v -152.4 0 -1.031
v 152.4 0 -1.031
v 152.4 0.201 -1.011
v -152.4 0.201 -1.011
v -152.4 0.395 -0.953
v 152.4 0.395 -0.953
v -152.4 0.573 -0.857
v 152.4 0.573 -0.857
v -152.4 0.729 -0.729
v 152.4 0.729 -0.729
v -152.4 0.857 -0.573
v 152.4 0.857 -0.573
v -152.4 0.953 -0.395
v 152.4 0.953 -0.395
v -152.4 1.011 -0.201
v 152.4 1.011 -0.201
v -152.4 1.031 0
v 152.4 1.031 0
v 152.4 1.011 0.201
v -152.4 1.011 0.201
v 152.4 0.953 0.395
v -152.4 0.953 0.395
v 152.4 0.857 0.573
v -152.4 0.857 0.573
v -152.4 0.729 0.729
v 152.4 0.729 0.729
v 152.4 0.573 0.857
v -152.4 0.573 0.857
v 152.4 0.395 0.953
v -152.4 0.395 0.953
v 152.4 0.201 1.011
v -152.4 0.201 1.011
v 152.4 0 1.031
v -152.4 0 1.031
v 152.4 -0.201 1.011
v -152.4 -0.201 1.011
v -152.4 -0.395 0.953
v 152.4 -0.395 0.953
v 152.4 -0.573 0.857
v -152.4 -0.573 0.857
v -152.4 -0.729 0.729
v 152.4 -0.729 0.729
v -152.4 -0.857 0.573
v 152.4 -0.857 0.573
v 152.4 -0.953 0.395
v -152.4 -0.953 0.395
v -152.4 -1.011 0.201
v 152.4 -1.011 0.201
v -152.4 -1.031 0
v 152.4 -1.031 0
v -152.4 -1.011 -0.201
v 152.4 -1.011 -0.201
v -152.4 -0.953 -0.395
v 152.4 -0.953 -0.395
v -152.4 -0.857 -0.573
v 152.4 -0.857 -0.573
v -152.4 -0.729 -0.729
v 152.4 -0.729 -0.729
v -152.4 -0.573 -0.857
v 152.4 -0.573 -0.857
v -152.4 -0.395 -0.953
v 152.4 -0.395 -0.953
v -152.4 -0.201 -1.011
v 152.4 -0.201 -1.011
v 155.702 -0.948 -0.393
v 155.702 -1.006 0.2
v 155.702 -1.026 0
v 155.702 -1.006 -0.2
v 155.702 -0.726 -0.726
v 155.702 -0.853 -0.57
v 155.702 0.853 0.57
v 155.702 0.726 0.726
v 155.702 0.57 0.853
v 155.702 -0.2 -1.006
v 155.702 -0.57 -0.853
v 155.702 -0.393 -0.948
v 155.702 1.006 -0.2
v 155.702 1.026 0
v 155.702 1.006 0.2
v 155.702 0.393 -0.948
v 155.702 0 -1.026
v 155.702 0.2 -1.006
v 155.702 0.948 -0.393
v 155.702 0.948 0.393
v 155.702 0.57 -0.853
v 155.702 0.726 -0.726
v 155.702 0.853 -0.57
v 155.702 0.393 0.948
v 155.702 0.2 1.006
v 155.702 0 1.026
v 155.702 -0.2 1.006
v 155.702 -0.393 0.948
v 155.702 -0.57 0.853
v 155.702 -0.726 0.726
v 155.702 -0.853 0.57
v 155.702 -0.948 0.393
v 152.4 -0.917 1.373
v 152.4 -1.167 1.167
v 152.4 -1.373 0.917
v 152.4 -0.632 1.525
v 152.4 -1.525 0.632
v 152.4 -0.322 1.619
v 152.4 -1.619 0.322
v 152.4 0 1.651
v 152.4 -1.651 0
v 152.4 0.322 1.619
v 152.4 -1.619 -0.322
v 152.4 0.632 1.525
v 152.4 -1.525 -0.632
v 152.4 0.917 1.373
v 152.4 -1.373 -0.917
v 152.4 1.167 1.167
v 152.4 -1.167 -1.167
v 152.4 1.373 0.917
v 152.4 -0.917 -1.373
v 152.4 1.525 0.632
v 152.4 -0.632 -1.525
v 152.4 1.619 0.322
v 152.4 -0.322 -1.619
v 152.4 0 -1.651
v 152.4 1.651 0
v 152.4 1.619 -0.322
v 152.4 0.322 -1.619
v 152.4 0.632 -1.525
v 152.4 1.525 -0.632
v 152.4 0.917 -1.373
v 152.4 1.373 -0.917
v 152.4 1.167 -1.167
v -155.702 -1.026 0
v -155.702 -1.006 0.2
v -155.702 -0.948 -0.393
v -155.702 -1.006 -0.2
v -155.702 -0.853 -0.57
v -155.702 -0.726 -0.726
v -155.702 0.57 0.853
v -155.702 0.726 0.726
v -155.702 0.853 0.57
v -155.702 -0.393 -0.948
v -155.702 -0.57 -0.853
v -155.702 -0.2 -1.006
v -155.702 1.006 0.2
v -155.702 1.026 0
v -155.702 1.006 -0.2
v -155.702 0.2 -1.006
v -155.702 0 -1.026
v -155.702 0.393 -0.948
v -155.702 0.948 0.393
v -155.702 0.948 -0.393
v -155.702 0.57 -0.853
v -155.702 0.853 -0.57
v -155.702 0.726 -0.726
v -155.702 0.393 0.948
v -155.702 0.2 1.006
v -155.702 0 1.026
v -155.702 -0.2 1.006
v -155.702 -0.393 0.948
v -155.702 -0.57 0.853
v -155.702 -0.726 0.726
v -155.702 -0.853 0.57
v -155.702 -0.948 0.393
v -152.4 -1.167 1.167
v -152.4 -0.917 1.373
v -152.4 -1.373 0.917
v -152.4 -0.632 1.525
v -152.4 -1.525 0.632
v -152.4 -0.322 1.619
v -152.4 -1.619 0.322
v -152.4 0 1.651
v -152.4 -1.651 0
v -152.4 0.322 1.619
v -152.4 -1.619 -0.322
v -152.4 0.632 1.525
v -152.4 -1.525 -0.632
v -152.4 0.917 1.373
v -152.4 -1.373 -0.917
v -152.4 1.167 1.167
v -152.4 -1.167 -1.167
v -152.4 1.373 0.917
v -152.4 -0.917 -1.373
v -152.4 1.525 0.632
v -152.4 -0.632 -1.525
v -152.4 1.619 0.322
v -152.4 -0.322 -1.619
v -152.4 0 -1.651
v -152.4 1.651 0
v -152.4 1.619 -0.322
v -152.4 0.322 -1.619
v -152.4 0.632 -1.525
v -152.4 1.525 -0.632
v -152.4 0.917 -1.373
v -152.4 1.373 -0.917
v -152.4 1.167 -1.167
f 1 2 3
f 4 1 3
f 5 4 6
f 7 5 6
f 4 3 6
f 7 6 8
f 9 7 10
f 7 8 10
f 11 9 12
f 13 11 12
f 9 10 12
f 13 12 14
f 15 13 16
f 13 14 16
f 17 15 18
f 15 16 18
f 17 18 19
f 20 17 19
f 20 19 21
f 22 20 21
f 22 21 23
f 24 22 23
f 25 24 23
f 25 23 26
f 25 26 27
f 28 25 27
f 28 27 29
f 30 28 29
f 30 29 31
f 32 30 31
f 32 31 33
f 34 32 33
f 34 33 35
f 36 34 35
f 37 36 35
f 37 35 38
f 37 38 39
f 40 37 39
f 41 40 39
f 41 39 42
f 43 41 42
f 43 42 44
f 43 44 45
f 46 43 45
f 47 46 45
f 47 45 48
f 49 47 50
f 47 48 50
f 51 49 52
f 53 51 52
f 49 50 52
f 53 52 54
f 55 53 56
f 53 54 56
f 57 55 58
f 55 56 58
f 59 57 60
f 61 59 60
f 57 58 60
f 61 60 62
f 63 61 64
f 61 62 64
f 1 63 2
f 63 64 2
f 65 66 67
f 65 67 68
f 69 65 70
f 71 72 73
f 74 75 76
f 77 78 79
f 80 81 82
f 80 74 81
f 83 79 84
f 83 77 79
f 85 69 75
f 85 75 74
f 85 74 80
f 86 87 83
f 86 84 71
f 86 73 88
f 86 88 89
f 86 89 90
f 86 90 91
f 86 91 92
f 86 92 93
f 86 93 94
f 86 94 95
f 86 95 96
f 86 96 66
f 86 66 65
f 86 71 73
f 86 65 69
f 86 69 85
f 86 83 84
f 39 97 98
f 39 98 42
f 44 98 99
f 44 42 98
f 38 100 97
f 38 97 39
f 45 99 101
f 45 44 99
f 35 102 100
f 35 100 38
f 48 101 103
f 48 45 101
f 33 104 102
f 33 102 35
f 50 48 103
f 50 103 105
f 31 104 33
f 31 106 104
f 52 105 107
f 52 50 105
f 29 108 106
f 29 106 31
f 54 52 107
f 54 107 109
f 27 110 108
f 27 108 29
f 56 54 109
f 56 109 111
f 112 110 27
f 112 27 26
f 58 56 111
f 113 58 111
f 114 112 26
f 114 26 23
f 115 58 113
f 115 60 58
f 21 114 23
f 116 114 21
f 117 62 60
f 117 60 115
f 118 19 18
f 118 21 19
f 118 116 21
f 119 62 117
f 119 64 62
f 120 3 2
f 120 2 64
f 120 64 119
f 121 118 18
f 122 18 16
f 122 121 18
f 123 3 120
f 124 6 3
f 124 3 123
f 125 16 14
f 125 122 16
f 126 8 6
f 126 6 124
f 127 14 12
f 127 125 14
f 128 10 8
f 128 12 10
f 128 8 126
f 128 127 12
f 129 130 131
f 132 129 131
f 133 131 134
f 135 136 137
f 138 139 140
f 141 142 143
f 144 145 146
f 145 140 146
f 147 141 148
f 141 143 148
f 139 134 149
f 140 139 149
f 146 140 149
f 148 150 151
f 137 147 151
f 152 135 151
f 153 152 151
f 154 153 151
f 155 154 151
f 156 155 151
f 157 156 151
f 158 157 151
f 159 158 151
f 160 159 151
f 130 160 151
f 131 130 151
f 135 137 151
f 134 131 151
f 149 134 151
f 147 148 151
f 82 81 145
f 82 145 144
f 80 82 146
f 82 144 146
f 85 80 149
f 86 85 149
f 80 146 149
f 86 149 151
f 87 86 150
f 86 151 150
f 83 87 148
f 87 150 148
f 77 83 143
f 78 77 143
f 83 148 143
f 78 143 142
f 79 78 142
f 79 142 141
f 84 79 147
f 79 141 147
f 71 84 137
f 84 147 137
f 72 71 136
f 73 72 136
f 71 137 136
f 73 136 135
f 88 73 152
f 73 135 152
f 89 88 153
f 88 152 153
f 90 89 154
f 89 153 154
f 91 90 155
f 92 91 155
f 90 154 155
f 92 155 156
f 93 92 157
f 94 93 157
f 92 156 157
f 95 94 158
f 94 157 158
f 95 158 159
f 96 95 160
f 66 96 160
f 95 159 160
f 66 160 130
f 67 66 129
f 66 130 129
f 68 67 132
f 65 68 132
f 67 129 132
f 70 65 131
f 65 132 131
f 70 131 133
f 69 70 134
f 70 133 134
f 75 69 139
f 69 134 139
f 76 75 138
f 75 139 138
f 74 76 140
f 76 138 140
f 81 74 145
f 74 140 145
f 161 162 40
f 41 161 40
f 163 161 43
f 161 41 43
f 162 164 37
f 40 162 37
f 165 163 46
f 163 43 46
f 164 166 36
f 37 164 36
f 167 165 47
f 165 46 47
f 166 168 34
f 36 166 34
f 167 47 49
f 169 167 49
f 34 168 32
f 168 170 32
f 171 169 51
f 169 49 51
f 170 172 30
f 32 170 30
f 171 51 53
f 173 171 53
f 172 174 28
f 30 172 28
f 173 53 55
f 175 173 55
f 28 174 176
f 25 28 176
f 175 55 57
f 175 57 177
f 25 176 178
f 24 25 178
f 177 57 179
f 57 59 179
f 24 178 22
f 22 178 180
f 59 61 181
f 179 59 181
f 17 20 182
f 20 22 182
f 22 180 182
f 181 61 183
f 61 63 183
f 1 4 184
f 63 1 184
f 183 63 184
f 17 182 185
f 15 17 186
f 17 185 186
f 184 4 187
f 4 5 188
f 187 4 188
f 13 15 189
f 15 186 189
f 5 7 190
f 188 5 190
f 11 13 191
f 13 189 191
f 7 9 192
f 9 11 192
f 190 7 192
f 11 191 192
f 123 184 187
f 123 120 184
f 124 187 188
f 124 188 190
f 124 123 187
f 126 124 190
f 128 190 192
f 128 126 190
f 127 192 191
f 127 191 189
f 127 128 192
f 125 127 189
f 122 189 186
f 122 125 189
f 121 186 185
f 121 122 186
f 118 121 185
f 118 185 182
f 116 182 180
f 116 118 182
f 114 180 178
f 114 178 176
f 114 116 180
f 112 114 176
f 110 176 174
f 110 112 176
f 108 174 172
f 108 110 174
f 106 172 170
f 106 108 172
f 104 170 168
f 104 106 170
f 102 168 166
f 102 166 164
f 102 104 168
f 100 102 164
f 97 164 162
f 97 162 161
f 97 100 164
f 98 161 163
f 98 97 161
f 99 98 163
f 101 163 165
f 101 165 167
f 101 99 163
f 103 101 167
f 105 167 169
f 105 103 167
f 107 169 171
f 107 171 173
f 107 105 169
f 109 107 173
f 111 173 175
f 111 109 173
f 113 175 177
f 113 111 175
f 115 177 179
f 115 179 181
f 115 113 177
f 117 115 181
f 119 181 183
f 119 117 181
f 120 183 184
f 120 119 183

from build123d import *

# Parameters (mm, degrees)
SKETCH3_R                = 1.651
SKETCH3_R_2              = 1.02616
BOSS_EXTRUDE1_DEPTH      = 152.4
BOSS_EXTRUDE2_DEPTH      = 155.702
BOSS_EXTRUDE2_DEPTH_BACK = 155.702
SKETCH4_R                = 1.02616
SKETCH5_R                = 1.03124
SKETCH5_R_2              = 1.02616
CUT_EXTRUDE1_DEPTH       = 309.110846946


with BuildPart() as part:
    # Sketch3 → Boss-Extrude1 (new, symmetric)
    with BuildSketch(Plane(origin=(0, 0, 0), x_dir=(0, 0, -1), z_dir=(1, 0, 0))):
        Circle(SKETCH3_R)
        Circle(SKETCH3_R_2, mode=Mode.SUBTRACT)
    extrude(amount=BOSS_EXTRUDE1_DEPTH, both=True)

    # Sketch5 → Cut-Extrude1 (cut, through all)
    with BuildSketch(Plane(origin=(152.4, 0, 0), x_dir=(0, 0, -1), z_dir=(1, 0, 0))):
        Circle(SKETCH5_R)
        Circle(SKETCH5_R_2, mode=Mode.SUBTRACT)
    extrude(amount=-CUT_EXTRUDE1_DEPTH, mode=Mode.SUBTRACT)


with BuildPart() as body_2:
    # Sketch4 → Boss-Extrude2 (new, two sides: drawn at the far end of the back side and taken through both)
    with BuildSketch(Plane(origin=(0, 0, 0), x_dir=(0, 0, -1), z_dir=(1, 0, 0)).offset(-BOSS_EXTRUDE2_DEPTH_BACK)):
        Circle(SKETCH4_R)
    extrude(amount=BOSS_EXTRUDE2_DEPTH + BOSS_EXTRUDE2_DEPTH_BACK)


solid = Compound([part.part, body_2.part])
